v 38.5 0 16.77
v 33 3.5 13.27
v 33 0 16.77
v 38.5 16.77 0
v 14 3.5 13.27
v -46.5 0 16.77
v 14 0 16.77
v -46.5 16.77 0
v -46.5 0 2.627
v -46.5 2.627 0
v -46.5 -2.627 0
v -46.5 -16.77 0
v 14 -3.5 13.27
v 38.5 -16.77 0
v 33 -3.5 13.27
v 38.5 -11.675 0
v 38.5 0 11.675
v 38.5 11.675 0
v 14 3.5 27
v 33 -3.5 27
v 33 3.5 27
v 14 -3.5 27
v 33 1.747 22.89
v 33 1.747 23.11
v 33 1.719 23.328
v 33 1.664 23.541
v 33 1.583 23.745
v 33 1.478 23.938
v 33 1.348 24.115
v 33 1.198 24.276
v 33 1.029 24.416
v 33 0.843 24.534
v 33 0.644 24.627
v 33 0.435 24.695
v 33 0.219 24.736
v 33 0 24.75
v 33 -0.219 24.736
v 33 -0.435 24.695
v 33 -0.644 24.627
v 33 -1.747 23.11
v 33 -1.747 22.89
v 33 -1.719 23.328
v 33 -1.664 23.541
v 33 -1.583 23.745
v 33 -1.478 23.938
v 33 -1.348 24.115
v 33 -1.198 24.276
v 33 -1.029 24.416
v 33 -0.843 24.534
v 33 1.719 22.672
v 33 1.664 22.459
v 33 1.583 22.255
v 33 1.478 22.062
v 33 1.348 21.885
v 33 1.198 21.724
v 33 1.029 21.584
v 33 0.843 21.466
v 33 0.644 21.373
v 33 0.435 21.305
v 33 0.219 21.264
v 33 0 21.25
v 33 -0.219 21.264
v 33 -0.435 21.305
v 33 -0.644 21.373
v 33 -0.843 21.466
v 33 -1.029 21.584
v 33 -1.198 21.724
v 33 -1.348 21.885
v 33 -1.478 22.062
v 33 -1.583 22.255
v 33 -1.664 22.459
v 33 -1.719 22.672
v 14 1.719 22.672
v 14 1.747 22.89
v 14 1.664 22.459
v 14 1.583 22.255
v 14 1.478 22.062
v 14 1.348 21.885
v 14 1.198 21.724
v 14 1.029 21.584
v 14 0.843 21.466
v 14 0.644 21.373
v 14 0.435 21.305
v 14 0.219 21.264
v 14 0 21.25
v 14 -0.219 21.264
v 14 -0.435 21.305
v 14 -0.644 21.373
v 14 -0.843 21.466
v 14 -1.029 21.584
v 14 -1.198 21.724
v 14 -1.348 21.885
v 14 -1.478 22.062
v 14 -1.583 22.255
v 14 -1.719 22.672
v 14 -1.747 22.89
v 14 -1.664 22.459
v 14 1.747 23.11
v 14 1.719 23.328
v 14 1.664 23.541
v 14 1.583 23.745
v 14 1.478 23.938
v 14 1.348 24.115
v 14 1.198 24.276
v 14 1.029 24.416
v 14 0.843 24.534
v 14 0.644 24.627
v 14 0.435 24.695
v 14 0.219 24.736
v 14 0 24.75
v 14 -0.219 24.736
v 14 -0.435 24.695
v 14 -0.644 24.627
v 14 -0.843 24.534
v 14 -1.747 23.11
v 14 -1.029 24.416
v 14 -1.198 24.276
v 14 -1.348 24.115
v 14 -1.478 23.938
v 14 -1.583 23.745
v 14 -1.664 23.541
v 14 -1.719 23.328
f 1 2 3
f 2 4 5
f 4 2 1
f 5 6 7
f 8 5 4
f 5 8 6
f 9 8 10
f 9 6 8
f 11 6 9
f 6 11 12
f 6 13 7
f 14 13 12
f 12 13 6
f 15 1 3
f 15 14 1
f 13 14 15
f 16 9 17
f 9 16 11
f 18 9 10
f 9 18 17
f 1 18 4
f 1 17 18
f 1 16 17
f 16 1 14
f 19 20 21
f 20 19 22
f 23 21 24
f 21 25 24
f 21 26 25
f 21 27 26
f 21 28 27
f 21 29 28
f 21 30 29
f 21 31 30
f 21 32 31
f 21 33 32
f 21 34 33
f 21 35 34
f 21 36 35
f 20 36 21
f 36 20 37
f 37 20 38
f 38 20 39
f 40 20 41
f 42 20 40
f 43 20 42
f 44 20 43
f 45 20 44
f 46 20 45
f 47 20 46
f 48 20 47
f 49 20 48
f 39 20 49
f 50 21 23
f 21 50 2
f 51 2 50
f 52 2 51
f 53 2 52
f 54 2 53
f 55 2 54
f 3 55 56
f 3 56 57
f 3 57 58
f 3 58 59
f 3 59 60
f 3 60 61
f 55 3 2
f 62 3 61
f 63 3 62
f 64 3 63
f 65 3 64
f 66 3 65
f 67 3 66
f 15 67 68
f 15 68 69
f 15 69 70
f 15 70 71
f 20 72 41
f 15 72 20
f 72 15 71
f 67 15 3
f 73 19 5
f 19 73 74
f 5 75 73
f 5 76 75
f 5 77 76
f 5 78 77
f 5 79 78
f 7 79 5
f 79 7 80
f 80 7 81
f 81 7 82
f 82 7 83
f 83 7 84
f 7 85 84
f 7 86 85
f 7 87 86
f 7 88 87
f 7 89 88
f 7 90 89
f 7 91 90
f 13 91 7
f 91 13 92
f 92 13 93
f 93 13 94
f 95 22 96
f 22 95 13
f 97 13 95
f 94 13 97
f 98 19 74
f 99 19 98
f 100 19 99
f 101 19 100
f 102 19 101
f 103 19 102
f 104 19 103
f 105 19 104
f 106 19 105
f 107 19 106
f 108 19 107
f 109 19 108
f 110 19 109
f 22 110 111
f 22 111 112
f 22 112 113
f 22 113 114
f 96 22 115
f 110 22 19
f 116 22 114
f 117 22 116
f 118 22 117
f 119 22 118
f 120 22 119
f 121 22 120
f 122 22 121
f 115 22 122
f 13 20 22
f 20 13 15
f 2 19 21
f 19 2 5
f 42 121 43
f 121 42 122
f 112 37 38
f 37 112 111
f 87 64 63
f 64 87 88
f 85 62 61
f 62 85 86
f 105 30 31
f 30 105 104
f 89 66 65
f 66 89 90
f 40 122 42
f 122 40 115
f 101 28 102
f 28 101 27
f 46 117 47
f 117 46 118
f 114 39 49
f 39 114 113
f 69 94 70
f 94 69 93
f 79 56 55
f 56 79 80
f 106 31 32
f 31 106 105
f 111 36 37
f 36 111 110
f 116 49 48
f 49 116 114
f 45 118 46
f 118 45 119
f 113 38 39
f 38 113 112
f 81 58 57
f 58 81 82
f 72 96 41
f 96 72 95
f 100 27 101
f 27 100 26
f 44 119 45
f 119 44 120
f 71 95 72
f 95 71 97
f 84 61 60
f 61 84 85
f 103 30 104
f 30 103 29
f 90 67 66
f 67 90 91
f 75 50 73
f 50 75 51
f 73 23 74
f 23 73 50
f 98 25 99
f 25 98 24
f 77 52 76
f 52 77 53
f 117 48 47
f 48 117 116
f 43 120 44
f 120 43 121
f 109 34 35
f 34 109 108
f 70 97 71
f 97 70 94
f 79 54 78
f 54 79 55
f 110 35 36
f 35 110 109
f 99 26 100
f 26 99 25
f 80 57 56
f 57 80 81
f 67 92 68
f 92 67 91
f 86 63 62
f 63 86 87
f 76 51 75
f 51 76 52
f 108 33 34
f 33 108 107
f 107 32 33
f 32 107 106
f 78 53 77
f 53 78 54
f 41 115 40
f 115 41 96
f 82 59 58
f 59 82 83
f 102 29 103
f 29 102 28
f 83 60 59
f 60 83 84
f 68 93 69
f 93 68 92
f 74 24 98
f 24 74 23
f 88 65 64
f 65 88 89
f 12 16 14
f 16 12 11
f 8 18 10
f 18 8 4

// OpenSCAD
//cylinder(h = 10, r1 = 20, r2 = 10, center = true, $fa=10);

top = 23;
bot = 16;
h = 93;
margin = 3;
h_cut = 85;
hinge_w = 7;
hinge_h = 19;
hinge_d = 10;
hinge_pin_r = 1.75;

module leg_sheath() {
        union() {
                difference() {
                        translate([0, 0, h/2]) cube([(max(bot,top) + margin) * 2, (max(bot,top) + margin) * 2, h], true);

                        polyhedron(
                                   points=[ [bot,bot,0],[bot,-bot,0],[-bot,-bot,0],[-bot,bot,0],
                                            [top,top,h],[top,-top,h],[-top,-top,h],[-top,top,h] ],
                   
                                   triangles=[ [0,2,1],[0,3,2],  // bottom
                                               [1,2,6],[1,6,5],
                                               [2,3,7],[2,7,6],
                                               [0,7,3],[0,4,7],
                                               [0,1,5],[0,5,4],
                                               [4,5,6],[4,6,7], ] // top
                                   );

                        // trim top
                        translate([0, 0, 50 + h_cut]) cube([100, 100, 100], true);
                }

                // hinge
                rotate([0, 0, 45]) translate([40, 0, 70]) {
                        difference() {
                                cube([hinge_d + 4, hinge_w, hinge_h], true);
                                // axle hole
                                translate([3, 0, 0]) rotate([0, 0, 0]) cylinder(r=hinge_pin_r, h=100, center=true, $fn=50);
                        }
                }
        }
}


//leg_sheath();

difference() {
        translate([-h / 2, 0, -20]) rotate([0, 90, 0]) rotate([0, 0, -45 + 180]) leg_sheath();
        translate([0, 0, -50]) cube([100, 100, 100], true);
}
